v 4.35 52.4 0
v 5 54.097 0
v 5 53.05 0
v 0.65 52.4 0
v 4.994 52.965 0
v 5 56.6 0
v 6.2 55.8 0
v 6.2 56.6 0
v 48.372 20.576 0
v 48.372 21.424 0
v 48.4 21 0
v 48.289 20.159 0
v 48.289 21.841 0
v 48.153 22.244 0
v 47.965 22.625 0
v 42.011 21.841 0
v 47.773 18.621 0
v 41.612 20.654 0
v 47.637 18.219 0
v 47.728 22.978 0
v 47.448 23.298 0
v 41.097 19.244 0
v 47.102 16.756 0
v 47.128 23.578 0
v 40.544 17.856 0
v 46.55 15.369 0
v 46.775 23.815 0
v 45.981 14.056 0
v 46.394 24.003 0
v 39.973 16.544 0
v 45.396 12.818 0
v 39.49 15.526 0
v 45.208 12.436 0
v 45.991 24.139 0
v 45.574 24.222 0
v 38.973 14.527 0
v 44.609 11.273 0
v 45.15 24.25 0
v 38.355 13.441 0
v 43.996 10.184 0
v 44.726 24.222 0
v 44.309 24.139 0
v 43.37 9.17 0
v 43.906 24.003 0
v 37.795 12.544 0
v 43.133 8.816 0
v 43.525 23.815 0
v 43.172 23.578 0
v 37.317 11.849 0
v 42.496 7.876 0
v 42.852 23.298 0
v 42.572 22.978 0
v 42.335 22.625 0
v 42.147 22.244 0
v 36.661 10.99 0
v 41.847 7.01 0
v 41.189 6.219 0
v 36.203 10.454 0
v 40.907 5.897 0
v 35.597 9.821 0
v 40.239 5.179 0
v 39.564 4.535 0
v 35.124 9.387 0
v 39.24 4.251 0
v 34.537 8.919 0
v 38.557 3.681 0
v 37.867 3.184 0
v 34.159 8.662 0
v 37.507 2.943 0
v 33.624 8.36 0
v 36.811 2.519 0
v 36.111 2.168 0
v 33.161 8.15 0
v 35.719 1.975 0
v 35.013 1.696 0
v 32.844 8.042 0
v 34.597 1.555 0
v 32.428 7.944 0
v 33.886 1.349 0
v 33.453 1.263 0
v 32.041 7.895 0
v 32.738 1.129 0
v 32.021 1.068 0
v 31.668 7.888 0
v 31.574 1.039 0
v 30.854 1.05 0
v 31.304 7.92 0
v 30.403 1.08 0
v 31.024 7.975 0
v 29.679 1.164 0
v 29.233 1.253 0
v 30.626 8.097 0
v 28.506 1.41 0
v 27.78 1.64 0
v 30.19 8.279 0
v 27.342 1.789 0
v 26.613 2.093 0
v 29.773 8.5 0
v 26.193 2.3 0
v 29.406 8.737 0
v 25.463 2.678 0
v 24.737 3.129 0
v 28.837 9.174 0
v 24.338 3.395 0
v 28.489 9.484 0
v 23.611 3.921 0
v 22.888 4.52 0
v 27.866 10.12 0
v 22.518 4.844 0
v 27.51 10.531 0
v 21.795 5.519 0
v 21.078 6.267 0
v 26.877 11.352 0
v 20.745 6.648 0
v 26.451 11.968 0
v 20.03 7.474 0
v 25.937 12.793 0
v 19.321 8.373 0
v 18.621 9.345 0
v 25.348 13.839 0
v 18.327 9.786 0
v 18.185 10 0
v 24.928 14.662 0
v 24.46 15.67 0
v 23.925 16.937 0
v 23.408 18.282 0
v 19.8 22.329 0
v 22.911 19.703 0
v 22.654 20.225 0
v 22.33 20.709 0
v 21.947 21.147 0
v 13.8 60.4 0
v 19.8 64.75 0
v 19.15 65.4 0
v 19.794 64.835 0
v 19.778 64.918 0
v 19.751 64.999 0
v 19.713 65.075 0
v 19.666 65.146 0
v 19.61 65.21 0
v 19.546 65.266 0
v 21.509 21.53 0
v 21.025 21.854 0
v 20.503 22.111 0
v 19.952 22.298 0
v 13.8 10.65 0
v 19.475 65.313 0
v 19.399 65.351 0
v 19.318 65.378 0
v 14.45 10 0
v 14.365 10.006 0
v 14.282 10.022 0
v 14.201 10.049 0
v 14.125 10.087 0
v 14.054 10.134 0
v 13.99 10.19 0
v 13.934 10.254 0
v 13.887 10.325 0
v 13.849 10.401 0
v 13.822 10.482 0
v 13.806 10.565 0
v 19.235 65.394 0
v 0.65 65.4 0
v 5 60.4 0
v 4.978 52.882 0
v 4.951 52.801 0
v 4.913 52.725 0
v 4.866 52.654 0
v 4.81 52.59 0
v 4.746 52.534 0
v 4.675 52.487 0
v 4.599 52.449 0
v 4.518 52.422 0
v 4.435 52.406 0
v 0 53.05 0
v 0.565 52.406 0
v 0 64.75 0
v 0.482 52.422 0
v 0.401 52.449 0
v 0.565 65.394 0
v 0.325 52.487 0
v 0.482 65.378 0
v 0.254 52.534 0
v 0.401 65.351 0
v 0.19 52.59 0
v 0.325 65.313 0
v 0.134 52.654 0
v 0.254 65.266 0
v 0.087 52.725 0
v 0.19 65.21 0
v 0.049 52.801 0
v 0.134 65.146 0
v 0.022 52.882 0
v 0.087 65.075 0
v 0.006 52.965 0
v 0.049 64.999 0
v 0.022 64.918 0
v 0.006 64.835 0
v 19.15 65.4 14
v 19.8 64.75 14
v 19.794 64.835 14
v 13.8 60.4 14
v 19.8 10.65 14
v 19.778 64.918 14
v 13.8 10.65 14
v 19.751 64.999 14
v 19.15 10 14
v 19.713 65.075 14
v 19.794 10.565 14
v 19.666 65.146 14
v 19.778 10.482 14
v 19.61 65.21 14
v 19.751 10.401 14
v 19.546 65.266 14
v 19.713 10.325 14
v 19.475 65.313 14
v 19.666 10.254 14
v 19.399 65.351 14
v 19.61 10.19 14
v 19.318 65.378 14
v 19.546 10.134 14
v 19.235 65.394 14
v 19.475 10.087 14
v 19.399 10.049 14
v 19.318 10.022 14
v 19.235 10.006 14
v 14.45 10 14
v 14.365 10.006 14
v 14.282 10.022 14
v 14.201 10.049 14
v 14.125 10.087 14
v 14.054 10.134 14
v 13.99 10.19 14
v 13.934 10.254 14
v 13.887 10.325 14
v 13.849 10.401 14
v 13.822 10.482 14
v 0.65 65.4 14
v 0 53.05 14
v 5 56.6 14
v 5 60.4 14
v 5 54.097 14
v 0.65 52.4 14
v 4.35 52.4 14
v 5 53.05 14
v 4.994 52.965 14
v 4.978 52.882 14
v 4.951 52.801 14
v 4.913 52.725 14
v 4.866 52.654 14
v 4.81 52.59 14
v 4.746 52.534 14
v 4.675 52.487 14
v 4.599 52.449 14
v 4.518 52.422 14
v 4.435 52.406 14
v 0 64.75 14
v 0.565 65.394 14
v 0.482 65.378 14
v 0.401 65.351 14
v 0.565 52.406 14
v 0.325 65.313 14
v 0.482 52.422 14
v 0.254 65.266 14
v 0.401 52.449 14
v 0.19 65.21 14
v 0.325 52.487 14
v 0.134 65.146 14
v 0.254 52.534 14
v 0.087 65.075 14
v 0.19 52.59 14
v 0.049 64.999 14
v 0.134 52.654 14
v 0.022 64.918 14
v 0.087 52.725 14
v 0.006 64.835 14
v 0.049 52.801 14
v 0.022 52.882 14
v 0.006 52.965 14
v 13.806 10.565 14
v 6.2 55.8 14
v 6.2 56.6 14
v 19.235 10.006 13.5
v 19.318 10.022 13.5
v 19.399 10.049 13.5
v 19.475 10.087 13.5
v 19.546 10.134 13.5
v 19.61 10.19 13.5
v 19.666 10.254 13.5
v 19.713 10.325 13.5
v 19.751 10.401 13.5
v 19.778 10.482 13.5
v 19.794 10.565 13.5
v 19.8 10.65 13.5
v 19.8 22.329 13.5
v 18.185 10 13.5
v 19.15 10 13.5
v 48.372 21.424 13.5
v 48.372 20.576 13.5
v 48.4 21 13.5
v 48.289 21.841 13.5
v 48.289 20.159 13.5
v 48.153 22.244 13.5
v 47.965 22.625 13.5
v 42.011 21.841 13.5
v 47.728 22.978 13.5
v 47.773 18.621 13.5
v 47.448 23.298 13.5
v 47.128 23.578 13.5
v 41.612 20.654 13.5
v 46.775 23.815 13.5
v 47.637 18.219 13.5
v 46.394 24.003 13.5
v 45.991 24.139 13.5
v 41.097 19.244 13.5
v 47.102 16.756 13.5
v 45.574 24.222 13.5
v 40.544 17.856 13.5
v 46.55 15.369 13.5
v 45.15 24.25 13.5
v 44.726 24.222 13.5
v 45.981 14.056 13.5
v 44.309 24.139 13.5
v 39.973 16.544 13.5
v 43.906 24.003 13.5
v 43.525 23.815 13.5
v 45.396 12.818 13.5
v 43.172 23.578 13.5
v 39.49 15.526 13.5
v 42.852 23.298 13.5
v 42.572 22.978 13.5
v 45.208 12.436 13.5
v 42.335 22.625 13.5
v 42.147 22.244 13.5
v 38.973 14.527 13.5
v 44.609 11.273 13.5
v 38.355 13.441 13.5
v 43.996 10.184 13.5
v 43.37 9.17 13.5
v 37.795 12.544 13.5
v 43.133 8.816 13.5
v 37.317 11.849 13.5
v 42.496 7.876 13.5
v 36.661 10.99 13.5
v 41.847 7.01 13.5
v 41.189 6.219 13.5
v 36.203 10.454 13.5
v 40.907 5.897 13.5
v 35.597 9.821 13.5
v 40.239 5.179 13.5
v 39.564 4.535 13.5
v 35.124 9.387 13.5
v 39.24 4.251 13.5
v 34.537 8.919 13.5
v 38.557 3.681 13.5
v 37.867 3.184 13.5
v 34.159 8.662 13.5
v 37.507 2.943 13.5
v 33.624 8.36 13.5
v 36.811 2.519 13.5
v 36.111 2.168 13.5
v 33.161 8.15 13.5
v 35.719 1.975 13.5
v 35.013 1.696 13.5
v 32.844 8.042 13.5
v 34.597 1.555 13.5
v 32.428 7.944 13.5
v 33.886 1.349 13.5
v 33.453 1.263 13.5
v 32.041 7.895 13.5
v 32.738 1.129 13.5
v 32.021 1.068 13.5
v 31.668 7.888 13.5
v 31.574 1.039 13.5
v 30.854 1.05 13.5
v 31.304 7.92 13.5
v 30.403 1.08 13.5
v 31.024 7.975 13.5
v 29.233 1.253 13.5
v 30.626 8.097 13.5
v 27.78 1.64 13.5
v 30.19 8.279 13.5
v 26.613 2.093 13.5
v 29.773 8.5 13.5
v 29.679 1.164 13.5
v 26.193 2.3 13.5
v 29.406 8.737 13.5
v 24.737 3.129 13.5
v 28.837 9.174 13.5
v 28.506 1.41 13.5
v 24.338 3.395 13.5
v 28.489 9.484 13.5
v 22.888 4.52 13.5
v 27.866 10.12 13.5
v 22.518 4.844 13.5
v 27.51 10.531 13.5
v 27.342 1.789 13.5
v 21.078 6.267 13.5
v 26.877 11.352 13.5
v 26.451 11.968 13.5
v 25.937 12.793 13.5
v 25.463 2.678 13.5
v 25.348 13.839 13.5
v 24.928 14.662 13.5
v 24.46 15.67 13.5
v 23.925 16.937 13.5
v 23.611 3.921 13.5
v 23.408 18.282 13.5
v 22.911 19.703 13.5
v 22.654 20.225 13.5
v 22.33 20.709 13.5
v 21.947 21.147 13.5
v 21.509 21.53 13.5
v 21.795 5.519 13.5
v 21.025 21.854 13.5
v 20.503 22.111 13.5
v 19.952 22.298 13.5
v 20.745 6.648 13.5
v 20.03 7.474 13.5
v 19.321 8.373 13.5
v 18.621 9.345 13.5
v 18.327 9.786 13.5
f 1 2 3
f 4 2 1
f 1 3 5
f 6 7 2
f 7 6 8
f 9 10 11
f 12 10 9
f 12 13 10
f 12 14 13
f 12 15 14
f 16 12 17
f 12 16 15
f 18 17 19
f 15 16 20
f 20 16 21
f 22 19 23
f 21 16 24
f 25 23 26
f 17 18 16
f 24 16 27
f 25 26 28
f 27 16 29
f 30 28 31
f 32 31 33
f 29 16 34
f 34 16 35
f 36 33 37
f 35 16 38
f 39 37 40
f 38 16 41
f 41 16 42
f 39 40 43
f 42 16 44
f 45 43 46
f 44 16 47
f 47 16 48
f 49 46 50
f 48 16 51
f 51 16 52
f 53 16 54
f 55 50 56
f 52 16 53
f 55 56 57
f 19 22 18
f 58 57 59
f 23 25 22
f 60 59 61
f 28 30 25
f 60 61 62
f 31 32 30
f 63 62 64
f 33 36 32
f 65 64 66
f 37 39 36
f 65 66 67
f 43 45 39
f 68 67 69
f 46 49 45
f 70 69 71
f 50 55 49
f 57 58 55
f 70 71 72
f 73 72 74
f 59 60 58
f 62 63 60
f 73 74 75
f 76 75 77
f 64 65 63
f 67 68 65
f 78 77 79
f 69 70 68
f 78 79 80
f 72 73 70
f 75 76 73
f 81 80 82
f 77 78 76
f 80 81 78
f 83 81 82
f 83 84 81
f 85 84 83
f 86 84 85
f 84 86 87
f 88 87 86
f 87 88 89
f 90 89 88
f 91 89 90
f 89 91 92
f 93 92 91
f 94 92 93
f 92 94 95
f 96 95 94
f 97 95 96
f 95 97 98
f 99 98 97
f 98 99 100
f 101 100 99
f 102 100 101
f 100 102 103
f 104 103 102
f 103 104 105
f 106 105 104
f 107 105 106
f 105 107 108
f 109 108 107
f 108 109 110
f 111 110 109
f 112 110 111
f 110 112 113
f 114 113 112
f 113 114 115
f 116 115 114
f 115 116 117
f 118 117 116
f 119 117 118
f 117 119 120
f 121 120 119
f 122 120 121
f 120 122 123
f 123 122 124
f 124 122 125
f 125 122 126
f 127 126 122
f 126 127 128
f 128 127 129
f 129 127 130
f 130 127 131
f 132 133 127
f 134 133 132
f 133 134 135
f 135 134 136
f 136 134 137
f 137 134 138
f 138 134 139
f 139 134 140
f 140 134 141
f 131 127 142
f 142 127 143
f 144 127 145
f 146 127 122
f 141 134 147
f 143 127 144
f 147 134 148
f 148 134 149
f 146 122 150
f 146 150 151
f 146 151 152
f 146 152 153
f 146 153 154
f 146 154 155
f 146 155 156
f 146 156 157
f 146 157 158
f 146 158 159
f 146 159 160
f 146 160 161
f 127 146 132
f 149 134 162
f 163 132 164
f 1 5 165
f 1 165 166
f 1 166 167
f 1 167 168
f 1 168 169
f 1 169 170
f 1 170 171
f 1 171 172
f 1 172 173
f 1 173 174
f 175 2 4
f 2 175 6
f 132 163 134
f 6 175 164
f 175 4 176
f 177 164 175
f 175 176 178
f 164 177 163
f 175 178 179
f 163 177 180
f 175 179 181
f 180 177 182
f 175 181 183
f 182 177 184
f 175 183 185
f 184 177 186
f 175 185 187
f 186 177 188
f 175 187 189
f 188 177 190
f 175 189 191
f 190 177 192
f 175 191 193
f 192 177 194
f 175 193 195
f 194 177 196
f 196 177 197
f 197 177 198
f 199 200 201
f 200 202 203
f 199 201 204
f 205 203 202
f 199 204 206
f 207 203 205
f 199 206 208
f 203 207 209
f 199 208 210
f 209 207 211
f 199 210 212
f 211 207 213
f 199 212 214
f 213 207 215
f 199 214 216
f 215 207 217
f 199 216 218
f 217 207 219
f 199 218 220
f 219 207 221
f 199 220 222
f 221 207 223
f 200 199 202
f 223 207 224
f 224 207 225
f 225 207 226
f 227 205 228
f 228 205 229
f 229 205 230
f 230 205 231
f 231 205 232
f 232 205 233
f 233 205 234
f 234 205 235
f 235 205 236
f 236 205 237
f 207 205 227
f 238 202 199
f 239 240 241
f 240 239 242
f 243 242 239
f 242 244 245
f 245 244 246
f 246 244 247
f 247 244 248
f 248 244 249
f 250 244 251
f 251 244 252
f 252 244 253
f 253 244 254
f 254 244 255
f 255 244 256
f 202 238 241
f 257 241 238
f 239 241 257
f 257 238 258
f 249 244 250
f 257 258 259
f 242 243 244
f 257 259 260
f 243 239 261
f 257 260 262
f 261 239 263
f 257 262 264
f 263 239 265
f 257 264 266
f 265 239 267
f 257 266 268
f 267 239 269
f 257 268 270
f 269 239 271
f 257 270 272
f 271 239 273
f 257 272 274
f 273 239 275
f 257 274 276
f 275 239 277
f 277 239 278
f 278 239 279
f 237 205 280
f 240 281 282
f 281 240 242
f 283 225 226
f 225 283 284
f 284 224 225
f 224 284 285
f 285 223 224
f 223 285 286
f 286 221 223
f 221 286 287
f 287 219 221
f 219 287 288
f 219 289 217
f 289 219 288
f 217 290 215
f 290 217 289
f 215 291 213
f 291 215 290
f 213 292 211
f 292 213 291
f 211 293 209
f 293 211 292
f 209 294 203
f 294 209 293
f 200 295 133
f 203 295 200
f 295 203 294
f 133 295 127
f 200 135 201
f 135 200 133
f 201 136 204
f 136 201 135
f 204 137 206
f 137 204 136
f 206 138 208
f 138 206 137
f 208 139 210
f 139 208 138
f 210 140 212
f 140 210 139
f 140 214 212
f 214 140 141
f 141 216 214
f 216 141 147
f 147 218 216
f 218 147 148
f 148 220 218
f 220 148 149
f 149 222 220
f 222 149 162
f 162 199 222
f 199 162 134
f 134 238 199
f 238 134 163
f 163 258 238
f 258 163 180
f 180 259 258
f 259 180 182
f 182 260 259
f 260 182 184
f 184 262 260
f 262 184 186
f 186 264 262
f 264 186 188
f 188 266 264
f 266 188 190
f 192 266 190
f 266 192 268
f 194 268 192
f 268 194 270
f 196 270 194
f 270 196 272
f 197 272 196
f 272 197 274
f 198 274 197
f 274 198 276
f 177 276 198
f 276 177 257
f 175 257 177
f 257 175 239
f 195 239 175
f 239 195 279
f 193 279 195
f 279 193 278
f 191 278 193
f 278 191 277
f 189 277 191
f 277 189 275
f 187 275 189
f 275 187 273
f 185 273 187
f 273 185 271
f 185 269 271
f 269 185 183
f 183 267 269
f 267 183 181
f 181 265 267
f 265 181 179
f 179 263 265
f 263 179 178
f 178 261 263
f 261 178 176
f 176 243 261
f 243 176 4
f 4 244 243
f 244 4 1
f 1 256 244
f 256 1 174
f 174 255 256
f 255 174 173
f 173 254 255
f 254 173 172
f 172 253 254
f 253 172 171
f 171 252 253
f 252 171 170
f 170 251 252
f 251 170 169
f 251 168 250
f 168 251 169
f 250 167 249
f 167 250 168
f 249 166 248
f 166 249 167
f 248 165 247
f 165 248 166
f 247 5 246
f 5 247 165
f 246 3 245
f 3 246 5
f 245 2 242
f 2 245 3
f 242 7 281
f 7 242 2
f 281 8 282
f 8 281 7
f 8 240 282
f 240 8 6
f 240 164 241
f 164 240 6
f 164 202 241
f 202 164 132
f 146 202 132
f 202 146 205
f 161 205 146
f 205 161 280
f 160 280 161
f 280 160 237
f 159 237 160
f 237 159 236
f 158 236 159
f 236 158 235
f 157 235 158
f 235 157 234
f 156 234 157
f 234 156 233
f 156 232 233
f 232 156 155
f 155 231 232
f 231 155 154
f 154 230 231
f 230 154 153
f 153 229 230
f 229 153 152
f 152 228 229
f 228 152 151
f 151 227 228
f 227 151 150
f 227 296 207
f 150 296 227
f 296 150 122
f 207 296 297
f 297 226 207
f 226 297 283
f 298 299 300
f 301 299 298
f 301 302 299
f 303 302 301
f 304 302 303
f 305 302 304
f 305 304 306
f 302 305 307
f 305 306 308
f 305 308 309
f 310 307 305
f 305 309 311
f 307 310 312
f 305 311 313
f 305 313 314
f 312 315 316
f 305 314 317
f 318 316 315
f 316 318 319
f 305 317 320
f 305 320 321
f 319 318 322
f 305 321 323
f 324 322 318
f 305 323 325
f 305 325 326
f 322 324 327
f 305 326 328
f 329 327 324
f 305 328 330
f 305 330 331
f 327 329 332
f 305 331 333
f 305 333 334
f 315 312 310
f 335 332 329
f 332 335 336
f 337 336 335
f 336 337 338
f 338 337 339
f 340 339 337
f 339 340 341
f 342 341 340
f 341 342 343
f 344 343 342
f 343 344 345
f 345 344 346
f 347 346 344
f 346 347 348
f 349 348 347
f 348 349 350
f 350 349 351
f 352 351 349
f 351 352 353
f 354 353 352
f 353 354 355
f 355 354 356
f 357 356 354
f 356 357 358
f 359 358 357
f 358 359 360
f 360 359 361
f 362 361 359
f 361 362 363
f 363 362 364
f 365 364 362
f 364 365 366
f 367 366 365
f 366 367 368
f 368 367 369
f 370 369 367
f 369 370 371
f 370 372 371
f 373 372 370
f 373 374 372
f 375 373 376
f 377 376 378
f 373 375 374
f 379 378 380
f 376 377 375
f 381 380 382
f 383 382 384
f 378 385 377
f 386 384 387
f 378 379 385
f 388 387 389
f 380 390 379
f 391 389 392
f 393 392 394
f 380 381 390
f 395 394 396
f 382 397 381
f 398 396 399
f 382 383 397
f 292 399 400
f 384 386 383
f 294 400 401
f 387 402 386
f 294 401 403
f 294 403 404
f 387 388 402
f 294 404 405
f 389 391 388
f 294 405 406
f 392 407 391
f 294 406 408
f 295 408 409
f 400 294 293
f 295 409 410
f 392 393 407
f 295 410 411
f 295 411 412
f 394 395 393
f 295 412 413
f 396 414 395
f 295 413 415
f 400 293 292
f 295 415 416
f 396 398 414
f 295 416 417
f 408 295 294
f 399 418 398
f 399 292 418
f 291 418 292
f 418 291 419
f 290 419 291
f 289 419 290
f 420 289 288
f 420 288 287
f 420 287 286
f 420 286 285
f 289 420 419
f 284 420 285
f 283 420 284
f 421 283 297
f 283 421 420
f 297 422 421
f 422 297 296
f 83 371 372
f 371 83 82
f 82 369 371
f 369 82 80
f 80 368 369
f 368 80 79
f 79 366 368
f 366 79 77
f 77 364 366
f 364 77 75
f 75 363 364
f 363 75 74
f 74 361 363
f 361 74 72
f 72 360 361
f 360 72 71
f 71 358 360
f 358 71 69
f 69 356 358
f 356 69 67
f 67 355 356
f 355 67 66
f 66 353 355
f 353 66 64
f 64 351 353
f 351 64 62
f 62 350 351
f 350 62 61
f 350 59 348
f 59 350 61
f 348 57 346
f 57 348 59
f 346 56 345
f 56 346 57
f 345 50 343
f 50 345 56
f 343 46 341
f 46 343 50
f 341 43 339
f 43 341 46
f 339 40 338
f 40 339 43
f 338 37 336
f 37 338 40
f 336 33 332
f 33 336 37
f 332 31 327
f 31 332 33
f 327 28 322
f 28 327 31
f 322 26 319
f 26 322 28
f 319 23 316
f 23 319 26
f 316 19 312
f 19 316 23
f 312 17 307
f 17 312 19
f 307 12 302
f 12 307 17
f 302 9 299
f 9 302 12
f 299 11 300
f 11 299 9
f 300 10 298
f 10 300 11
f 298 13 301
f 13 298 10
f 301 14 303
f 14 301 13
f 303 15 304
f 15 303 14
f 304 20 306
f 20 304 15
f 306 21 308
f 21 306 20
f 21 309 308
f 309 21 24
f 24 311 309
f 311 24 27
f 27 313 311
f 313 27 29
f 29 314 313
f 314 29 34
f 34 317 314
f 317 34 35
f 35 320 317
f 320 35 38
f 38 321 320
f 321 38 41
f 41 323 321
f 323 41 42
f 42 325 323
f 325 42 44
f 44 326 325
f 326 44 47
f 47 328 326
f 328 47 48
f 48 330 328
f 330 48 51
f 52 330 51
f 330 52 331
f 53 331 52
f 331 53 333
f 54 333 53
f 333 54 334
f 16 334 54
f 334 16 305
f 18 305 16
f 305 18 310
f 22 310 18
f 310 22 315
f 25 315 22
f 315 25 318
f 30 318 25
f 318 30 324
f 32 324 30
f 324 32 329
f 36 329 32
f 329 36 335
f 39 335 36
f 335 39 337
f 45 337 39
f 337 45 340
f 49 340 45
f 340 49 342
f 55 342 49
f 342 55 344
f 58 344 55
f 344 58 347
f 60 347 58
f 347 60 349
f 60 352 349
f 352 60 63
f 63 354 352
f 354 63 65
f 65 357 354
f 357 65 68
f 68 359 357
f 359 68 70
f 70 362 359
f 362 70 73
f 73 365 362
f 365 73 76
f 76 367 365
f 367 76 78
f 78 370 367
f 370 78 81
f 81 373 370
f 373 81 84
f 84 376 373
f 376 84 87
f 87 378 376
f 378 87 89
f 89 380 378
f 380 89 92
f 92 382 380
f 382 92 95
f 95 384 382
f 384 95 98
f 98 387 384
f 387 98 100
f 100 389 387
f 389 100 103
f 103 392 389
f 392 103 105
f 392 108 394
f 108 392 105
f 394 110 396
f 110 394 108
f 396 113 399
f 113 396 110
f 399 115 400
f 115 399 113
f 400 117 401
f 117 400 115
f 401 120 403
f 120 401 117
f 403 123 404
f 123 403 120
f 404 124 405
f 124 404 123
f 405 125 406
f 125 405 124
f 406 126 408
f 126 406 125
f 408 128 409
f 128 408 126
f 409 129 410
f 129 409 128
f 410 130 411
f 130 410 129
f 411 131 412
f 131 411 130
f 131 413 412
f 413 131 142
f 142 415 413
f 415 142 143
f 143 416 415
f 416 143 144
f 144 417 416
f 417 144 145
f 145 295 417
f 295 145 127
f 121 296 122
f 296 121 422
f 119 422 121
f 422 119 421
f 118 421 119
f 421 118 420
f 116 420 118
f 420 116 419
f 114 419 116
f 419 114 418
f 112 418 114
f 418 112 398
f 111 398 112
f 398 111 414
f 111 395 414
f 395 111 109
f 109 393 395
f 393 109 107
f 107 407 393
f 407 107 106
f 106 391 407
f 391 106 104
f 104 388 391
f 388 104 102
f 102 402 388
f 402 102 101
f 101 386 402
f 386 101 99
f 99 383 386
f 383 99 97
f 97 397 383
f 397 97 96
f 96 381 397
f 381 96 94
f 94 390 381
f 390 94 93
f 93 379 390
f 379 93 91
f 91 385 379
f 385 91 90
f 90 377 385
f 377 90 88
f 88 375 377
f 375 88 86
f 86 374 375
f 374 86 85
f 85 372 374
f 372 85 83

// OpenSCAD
// Gancio scaffale V4 - mm. Prototipo con uncino interno.
parte="gancio"; // [gancio,campione]
altezza_profilo=50;
apertura_profilo=44;
profondita_bordo=8;
gioco=0.4;
larghezza=14; // incastro invariato
larghezza_stelo=13.5;
sporgenza=35;
dorso=6;
ponte=5;
ritorno=5;
lunghezza_ritorno=8;
dente=1.2;
quota_sotto_bordo=47; // 50-3: ASSUNZIONE sulla faccia inferiore della piega superiore
luce_dente=0.4;
stelo=6.5;
$fn=48;
a=gioco; b=a+dorso; c=-profondita_bordo-gioco; d=c-ritorno;
h=altezza_profilo+gioco;
function bez(t,p0,p1,p2,p3)=(1-t)*(1-t)*(1-t)*p0+3*(1-t)*(1-t)*t*p1+3*(1-t)*t*t*p2+t*t*t*p3;
function centro(t)=bez(t,[b-1,8],[13,-11],[25,-10],[sporgenza-stelo/2,11]);
module aggancio(){
 offset(r=0.65) offset(delta=-0.65) polygon([[a,0],[a,h],[c,h],[c,h-lunghezza_ritorno],[d,h-lunghezza_ritorno],[d,h+ponte],[b,h+ponte],[b,0]]);
 // Dente rivolto verso la faccia esterna: si porta sotto la piega interna.
 translate([c-0.35,0]) polygon([[0,quota_sotto_bordo-luce_dente-3],[dente+0.35,quota_sotto_bordo-luce_dente-0.8],[dente+0.35,quota_sotto_bordo-luce_dente],[0,quota_sotto_bordo-luce_dente]]);
}
module braccio(){
 for(i=[0:39]) hull(){
 translate(centro(i/40)) circle(r=stelo/2+1.2*pow(1-i/40,3));
 translate(centro((i+1)/40)) circle(r=stelo/2+1.2*pow(1-(i+1)/40,3));
 }
}
module sezione(){union(){aggancio();braccio();}}
assert(profondita_bordo>0 && dente<profondita_bordo);
// Faccia di stampa comune a Z=0; il mezzo millimetro e tolto sul lato superiore.
translate([-d,parte=="campione"?-(h-15):10,0])
if(parte=="campione") linear_extrude(height=8,convexity=10)
 intersection(){aggancio();translate([d-1,h-15]) square([b-d+2,22]);}
else union(){
 linear_extrude(height=larghezza,convexity=10) aggancio();
 linear_extrude(height=larghezza_stelo,convexity=10) braccio();
}
